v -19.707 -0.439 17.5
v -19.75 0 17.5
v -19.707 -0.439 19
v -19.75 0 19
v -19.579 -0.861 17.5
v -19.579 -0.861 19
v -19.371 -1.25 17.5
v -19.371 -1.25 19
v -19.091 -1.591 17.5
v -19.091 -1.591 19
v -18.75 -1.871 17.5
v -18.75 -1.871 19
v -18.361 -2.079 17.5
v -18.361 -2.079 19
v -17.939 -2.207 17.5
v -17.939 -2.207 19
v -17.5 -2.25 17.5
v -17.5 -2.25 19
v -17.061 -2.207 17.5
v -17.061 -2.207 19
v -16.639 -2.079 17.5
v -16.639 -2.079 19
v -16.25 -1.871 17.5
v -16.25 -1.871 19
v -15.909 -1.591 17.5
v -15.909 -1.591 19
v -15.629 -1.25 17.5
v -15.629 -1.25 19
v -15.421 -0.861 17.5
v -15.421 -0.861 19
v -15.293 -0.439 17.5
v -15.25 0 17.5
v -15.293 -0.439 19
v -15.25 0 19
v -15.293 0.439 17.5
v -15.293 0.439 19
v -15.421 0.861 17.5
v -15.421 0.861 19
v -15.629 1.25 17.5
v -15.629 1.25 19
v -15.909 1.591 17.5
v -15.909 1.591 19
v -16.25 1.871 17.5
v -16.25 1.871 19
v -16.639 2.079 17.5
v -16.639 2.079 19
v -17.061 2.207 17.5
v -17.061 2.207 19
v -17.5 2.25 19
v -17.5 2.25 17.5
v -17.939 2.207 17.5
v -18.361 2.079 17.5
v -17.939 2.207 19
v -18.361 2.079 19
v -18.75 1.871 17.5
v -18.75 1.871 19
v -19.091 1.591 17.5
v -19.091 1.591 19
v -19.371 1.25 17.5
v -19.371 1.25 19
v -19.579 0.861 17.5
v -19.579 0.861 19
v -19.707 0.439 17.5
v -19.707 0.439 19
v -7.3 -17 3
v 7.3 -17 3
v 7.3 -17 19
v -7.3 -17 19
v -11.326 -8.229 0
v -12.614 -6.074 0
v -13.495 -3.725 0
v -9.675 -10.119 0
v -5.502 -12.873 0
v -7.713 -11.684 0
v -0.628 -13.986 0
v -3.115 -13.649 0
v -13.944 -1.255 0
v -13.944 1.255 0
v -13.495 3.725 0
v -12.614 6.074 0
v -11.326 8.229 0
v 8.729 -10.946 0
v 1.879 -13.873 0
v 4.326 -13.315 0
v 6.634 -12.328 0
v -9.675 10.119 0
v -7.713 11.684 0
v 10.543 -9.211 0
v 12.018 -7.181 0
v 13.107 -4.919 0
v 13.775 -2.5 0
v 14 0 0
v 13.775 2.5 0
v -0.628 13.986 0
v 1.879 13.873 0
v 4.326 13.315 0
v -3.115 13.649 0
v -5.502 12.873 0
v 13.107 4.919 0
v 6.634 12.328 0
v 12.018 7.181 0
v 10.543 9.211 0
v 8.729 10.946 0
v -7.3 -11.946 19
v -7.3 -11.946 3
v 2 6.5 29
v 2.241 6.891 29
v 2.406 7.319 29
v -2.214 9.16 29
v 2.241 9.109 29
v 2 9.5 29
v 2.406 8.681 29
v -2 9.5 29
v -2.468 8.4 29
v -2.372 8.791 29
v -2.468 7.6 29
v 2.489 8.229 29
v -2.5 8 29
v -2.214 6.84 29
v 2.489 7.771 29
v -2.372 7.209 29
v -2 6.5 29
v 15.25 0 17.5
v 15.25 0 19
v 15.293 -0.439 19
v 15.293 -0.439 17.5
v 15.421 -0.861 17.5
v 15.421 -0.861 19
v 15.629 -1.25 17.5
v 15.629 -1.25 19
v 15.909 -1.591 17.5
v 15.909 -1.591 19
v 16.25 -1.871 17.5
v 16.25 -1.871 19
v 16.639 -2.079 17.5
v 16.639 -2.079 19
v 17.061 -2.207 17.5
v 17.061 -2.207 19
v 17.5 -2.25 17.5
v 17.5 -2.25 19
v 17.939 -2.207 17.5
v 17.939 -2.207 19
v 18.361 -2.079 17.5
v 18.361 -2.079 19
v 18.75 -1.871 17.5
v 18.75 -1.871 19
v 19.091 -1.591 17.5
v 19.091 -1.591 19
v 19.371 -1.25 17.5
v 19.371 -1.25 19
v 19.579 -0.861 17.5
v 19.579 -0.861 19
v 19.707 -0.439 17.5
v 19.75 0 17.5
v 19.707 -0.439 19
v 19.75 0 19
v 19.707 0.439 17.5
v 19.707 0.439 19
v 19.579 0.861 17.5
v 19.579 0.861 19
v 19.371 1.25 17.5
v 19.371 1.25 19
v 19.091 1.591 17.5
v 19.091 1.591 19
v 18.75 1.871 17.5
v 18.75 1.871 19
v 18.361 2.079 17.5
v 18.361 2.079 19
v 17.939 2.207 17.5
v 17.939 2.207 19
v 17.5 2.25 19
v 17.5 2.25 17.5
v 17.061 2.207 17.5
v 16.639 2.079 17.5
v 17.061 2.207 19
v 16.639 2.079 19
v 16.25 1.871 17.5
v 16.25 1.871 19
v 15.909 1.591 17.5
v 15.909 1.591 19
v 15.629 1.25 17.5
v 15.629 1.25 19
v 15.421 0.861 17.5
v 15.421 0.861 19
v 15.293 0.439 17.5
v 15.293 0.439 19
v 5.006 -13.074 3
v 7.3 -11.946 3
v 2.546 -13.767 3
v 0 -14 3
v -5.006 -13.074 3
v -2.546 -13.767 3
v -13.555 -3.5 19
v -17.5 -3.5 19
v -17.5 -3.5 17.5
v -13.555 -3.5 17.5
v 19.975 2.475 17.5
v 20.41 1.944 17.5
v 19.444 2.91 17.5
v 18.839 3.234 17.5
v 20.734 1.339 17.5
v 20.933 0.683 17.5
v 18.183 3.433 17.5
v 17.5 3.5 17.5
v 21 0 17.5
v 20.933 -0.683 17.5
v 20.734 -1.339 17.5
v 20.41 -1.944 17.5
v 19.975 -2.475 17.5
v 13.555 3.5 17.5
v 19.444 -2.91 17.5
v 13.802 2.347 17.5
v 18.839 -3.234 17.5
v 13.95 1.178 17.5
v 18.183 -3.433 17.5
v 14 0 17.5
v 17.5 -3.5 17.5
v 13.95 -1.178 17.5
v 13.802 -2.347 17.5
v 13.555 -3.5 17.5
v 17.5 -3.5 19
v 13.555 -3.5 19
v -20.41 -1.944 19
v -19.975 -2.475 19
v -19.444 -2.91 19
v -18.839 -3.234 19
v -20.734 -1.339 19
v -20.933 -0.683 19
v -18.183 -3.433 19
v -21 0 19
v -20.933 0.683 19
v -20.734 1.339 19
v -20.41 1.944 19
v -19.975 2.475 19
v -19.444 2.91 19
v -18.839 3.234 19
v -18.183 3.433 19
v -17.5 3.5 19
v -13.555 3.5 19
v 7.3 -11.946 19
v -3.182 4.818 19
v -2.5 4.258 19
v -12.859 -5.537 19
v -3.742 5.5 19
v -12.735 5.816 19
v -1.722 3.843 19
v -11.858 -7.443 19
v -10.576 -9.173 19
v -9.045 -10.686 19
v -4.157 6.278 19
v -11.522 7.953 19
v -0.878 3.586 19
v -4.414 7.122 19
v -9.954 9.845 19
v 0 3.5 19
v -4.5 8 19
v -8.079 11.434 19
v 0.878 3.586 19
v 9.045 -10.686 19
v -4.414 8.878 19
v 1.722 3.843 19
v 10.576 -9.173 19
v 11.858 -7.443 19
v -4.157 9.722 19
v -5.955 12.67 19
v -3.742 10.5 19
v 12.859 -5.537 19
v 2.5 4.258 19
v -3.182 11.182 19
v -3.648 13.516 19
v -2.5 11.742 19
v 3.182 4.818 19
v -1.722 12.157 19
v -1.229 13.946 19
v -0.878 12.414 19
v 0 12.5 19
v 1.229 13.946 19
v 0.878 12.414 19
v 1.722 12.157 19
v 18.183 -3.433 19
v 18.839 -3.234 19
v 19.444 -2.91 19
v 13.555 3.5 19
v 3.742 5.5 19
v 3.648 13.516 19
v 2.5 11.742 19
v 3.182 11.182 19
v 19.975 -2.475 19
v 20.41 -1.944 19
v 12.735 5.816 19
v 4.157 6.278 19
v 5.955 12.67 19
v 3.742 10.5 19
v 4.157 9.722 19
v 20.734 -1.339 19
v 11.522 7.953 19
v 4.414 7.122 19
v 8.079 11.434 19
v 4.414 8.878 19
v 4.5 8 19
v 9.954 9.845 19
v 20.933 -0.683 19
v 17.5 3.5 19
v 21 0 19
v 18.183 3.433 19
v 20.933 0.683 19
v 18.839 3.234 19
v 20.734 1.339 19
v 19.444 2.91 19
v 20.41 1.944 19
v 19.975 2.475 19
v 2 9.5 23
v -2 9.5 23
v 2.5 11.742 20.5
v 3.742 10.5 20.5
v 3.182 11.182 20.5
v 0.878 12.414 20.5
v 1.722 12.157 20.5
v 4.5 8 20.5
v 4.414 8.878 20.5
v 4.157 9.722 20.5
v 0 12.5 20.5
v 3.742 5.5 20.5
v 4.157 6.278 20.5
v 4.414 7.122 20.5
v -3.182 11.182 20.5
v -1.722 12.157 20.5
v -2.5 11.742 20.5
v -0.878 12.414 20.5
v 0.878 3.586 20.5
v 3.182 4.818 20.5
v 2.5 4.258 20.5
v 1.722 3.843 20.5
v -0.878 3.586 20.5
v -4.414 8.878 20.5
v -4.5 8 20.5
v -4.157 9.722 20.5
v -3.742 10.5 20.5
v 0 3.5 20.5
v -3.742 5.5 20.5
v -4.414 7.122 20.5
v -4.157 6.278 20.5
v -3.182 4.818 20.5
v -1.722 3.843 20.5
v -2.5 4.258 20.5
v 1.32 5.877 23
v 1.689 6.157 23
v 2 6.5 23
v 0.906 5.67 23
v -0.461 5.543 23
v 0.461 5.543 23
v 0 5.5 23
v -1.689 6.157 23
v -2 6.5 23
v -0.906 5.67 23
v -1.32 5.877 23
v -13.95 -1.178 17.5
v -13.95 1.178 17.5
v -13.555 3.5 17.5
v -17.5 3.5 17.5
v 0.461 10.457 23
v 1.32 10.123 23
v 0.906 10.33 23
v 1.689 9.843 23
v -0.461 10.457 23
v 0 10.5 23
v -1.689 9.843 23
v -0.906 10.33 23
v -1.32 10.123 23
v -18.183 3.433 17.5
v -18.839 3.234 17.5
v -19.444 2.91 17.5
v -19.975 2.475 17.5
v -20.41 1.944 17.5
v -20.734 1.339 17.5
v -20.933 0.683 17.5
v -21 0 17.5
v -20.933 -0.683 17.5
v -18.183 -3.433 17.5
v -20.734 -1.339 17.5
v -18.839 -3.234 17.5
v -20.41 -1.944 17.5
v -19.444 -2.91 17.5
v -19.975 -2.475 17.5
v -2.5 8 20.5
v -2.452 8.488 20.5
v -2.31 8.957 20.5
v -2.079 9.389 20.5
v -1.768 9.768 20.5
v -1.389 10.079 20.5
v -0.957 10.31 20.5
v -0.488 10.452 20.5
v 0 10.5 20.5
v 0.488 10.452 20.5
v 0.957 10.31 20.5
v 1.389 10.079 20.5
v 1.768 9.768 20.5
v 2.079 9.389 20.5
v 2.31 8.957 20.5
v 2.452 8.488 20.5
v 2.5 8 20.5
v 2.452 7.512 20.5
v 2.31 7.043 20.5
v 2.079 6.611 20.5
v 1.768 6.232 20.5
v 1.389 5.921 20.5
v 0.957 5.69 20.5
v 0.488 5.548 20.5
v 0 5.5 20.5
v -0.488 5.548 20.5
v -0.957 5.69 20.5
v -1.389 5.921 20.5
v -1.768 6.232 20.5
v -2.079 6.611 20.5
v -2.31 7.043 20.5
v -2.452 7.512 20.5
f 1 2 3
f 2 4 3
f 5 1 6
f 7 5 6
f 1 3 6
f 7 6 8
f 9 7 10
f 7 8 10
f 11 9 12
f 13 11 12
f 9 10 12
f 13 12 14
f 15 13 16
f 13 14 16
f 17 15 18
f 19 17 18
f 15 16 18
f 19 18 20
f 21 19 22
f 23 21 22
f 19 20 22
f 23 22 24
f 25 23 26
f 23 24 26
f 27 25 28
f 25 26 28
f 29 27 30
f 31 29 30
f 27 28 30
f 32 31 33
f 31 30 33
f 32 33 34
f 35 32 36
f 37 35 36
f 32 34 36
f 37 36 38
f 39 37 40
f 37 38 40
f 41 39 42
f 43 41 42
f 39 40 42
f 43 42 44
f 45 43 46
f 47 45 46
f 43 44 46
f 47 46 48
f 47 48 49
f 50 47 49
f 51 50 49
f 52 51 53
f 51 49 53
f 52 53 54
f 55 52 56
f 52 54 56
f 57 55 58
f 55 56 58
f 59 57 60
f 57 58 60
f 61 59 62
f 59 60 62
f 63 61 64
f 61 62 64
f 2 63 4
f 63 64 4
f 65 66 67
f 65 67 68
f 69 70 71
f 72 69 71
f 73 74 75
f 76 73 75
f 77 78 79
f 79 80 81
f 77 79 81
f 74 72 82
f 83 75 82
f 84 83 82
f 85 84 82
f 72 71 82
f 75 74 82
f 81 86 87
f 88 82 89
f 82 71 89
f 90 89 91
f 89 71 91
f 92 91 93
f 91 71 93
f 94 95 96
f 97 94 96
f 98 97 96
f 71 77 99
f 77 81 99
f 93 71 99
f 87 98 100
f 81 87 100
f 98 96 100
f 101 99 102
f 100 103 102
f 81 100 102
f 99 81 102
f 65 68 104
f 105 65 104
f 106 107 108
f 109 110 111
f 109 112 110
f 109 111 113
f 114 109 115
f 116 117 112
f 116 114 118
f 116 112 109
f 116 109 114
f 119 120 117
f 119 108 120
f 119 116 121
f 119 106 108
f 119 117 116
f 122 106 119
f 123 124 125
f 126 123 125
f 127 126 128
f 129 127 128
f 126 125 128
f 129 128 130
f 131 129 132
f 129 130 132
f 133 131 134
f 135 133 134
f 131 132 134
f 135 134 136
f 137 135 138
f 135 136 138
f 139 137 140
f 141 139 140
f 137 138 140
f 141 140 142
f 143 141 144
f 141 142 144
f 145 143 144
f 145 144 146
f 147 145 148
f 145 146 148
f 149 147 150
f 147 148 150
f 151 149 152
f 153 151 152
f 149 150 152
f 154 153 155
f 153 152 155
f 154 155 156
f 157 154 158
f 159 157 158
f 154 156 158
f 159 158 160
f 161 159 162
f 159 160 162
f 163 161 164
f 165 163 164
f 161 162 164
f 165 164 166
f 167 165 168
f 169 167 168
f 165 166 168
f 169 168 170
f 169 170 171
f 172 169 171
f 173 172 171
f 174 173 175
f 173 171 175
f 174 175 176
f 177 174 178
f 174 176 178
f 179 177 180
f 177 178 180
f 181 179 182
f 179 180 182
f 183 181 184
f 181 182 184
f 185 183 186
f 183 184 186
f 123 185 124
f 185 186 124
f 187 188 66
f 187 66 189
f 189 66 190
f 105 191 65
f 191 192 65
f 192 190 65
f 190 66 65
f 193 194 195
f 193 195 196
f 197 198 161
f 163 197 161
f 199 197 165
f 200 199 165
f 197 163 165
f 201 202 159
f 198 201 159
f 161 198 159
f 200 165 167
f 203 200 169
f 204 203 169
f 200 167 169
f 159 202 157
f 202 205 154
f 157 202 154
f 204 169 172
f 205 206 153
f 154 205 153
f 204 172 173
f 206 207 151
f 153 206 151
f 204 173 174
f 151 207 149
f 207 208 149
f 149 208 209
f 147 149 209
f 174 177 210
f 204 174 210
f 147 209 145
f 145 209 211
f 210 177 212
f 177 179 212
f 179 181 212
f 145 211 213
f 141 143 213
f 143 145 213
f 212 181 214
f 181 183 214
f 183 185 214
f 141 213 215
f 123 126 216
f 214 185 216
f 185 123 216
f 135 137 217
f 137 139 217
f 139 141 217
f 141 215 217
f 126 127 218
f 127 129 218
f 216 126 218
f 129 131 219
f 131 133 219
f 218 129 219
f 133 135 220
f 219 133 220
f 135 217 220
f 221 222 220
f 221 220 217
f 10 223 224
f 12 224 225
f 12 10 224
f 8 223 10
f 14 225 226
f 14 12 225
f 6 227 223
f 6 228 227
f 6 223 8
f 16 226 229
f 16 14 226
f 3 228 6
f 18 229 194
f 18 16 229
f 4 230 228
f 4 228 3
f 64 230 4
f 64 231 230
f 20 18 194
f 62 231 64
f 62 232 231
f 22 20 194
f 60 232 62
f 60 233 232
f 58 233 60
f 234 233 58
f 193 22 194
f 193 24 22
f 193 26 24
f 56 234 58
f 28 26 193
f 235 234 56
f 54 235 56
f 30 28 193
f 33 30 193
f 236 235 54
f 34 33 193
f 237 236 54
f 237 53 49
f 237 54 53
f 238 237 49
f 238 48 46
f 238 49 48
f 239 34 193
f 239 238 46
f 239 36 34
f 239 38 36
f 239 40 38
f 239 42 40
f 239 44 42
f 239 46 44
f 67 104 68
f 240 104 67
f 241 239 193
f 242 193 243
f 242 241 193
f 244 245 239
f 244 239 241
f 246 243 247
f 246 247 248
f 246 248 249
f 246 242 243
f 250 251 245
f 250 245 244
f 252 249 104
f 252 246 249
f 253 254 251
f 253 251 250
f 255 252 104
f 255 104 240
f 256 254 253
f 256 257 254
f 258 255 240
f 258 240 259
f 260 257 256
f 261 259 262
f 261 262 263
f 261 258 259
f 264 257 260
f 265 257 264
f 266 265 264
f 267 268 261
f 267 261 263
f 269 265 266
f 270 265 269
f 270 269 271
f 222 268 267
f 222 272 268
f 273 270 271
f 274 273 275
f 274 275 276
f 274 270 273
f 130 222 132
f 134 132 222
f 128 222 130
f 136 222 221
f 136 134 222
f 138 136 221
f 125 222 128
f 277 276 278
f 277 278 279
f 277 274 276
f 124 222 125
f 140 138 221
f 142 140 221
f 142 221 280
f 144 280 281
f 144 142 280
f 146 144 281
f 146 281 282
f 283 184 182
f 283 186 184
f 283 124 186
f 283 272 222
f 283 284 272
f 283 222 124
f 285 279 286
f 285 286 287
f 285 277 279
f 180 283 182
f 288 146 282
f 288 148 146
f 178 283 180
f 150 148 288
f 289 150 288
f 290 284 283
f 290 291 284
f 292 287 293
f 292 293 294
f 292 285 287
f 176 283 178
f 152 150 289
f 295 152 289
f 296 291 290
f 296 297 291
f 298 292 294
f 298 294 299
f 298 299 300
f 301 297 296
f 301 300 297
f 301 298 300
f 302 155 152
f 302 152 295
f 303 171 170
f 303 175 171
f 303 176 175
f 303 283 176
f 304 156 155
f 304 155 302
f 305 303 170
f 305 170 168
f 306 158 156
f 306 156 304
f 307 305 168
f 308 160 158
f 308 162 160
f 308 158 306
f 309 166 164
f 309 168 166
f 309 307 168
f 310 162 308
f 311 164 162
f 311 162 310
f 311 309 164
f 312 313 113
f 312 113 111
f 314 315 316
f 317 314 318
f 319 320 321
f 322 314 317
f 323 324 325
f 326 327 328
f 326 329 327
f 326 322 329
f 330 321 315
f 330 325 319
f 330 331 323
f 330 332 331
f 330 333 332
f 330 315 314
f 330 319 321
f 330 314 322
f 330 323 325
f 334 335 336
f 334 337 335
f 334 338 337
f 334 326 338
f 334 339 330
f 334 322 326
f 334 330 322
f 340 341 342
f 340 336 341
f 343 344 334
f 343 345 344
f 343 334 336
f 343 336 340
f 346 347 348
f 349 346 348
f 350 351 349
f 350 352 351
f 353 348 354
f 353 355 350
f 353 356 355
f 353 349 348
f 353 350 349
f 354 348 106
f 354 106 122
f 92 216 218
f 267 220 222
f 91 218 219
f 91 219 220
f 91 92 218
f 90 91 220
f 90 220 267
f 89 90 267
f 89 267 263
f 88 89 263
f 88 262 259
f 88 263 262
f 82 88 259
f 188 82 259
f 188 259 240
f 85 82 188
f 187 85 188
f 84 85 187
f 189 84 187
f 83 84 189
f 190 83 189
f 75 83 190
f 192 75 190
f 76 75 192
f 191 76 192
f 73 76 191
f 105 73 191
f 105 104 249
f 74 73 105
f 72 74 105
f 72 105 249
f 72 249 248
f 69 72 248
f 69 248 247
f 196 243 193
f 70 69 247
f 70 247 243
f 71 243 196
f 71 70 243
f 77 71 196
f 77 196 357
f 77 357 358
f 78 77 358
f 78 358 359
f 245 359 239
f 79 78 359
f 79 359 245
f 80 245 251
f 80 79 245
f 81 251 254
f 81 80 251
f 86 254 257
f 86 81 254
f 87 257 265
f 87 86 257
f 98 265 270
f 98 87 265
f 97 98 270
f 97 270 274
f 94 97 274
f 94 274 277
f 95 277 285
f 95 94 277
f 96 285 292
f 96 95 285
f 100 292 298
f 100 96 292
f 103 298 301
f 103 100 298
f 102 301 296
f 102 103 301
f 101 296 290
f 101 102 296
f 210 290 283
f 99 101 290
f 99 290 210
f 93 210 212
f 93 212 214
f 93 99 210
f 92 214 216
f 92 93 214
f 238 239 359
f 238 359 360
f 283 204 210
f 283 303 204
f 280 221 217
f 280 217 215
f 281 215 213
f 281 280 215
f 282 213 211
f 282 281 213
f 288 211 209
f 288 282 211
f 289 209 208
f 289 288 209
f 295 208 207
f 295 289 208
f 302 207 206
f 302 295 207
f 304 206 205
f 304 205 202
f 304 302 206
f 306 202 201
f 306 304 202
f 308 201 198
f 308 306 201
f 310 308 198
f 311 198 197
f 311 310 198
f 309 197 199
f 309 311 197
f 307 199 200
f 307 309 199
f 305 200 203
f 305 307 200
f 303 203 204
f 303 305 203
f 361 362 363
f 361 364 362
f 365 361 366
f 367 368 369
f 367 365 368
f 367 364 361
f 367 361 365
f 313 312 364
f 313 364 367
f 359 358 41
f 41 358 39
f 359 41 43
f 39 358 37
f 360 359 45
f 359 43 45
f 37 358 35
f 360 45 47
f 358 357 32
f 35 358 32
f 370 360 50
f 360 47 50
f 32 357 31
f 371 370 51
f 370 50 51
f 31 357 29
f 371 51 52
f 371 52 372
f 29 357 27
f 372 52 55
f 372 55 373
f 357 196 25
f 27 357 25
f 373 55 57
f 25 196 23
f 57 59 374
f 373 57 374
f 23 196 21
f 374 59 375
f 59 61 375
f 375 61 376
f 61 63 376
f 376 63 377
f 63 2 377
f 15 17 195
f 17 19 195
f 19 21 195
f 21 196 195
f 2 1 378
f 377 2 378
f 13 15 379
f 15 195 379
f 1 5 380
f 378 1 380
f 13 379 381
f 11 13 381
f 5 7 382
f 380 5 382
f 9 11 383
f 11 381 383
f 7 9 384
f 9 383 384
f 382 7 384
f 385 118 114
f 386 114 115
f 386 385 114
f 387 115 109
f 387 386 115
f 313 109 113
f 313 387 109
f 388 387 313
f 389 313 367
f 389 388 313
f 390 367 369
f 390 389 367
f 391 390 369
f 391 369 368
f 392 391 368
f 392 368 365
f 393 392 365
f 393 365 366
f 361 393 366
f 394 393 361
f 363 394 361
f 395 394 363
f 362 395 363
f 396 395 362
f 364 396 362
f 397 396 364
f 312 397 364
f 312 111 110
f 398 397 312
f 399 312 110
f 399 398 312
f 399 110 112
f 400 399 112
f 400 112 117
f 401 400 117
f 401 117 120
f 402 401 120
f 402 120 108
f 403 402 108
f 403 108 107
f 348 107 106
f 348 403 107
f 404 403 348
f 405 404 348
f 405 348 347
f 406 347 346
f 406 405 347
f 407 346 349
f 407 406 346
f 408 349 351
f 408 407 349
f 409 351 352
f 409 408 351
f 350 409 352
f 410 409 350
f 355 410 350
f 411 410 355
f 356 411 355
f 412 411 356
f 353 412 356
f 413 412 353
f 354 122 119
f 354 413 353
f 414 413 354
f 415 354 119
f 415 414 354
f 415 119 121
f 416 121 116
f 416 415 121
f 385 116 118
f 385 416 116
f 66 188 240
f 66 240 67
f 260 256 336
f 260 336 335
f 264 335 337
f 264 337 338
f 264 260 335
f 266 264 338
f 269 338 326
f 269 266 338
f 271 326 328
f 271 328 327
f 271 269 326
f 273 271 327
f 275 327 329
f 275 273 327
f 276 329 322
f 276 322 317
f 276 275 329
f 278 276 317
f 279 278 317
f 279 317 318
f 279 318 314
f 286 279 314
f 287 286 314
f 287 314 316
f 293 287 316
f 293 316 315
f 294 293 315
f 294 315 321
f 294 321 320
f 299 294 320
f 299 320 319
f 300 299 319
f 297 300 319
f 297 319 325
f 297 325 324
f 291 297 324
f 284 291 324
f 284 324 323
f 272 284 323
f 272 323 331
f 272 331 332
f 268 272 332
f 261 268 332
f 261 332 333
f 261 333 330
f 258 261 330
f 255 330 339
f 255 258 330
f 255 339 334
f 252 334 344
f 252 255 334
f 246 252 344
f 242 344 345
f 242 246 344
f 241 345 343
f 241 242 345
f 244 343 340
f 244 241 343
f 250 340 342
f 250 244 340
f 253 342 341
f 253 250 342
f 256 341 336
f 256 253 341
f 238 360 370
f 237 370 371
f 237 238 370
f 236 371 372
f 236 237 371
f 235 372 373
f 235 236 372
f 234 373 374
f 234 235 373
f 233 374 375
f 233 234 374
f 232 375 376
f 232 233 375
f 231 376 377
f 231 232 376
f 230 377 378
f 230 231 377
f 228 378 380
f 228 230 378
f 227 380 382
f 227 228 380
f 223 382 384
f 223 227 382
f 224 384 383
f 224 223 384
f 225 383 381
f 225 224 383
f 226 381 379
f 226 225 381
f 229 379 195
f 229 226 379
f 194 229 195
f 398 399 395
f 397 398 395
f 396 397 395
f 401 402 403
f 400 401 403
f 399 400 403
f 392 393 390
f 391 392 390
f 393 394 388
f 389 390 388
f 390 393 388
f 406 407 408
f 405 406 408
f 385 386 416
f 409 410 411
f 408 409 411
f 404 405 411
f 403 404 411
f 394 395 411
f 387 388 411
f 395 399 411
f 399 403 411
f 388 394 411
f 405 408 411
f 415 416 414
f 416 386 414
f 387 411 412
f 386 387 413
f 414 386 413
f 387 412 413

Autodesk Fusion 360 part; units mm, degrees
sketch "Sketch1" plane through (0, 0, 0) normal (0, 0, 1) x (1, 0, 0)
  circle A0 centre (0, 0) radius 14
  dimension "d151" = 28
extrude "Extrude1" add sketch "Sketch1" along normal blind 19 makes body 1
sketch "Sketch6" plane through (0, 0, 19) normal (0, 0, 1) x (-1, 0, 0)
  circle A0 centre (0, 0) radius 14
  circle A1 centre (0, -8) radius 4.5
  line L0 (-21, -3.5) -> (21, -3.5)
  line L1 (21, -3.5) -> (21, 3.5)
  line L2 (21, 3.5) -> (-21, 3.5)
  line L3 (-21, 3.5) -> (-21, -3.5)
  line L4 (-21, -3.5) -> (21, 3.5) construction
  line L5 (21, -3.5) -> (-21, 3.5) construction
  circle A2 centre (17.5, 0) radius 3.5
  circle A3 centre (17.5, 0) radius 2.25
  line L6 (0, 0) -> (0, -17) construction
  circle A4 centre (-17.5, 0) radius 3.5
  circle A5 centre (-17.5, 0) radius 2.25
  line L7 (7.3, 0) -> (-7.3, 0)
  line L8 (-7.3, 0) -> (-7.3, 17)
  line L9 (-7.3, 17) -> (7.3, 17)
  line L10 (7.3, 17) -> (7.3, 0)
  dimension "d563" = 9
  dimension "d564" = 8
  dimension "d565" = 7
  dimension "d566" = 4.5
  dimension "d567" = 35
  dimension "d581" = 17
  dimension "d582" = 14.6
extrude "Extrude6" add sketch "Sketch6" along normal blind 1.5 contours A1 bodies 1
sketch "Sketch7" plane through (0, 0, 20.5) normal (0, 0, 1) x (-1, 0, 0)
  circle A0 centre (0, -8) radius 4.5
  circle A1 centre (0, -8) radius 2.5
  line L0 (2.5, -9.5) -> (-2.5, -9.5)
  line L1 (-2.5, -9.5) -> (-2.5, -6.5)
  line L2 (-2.5, -6.5) -> (2.5, -6.5)
  line L3 (2.5, -6.5) -> (2.5, -9.5)
  line L4 (2.5, -9.5) -> (-2.5, -6.5) construction
  line L5 (2.5, -6.5) -> (-2.5, -9.5) construction
  circle A2 centre (0, -8) radius 3.5
  dimension "d570" = 5
  dimension "d571" = 3
  dimension "d679" = 1
extrude "Extrude9" add sketch "Sketch6" against normal blind 1.5 contours A0 L0 A2 | A0 L2 A2 | A2 | A0 L0 A4 | A0 L2 A4 | A4 bodies 1
extrude "Extrude10" add sketch "Sketch6" against normal blind 16 contours A0 L8 L9 L10 bodies 1
extrude "Extrude1'" add sketch "Sketch7" along normal blind 2.5 separate body contours A1 L0 L2 | A1 L2 | A1 L0 makes body 2 in component "Axis"
extrude "Extrude2" add sketch "Sketch7" along normal up to surface (8.5 mm away) contours A1 L0 L2 bodies 2 in component "Axis"
component "Axis" placed x (1, 0, 0) y (0, 1, 0) z (0, 0, 1) at (0, 0, 0)
equation "d151 = motor_diameter"
equation "d152 = motor_heigth"
equation "motor_diameter = 28 mm"
equation "motor_heigth = 19 mm"
